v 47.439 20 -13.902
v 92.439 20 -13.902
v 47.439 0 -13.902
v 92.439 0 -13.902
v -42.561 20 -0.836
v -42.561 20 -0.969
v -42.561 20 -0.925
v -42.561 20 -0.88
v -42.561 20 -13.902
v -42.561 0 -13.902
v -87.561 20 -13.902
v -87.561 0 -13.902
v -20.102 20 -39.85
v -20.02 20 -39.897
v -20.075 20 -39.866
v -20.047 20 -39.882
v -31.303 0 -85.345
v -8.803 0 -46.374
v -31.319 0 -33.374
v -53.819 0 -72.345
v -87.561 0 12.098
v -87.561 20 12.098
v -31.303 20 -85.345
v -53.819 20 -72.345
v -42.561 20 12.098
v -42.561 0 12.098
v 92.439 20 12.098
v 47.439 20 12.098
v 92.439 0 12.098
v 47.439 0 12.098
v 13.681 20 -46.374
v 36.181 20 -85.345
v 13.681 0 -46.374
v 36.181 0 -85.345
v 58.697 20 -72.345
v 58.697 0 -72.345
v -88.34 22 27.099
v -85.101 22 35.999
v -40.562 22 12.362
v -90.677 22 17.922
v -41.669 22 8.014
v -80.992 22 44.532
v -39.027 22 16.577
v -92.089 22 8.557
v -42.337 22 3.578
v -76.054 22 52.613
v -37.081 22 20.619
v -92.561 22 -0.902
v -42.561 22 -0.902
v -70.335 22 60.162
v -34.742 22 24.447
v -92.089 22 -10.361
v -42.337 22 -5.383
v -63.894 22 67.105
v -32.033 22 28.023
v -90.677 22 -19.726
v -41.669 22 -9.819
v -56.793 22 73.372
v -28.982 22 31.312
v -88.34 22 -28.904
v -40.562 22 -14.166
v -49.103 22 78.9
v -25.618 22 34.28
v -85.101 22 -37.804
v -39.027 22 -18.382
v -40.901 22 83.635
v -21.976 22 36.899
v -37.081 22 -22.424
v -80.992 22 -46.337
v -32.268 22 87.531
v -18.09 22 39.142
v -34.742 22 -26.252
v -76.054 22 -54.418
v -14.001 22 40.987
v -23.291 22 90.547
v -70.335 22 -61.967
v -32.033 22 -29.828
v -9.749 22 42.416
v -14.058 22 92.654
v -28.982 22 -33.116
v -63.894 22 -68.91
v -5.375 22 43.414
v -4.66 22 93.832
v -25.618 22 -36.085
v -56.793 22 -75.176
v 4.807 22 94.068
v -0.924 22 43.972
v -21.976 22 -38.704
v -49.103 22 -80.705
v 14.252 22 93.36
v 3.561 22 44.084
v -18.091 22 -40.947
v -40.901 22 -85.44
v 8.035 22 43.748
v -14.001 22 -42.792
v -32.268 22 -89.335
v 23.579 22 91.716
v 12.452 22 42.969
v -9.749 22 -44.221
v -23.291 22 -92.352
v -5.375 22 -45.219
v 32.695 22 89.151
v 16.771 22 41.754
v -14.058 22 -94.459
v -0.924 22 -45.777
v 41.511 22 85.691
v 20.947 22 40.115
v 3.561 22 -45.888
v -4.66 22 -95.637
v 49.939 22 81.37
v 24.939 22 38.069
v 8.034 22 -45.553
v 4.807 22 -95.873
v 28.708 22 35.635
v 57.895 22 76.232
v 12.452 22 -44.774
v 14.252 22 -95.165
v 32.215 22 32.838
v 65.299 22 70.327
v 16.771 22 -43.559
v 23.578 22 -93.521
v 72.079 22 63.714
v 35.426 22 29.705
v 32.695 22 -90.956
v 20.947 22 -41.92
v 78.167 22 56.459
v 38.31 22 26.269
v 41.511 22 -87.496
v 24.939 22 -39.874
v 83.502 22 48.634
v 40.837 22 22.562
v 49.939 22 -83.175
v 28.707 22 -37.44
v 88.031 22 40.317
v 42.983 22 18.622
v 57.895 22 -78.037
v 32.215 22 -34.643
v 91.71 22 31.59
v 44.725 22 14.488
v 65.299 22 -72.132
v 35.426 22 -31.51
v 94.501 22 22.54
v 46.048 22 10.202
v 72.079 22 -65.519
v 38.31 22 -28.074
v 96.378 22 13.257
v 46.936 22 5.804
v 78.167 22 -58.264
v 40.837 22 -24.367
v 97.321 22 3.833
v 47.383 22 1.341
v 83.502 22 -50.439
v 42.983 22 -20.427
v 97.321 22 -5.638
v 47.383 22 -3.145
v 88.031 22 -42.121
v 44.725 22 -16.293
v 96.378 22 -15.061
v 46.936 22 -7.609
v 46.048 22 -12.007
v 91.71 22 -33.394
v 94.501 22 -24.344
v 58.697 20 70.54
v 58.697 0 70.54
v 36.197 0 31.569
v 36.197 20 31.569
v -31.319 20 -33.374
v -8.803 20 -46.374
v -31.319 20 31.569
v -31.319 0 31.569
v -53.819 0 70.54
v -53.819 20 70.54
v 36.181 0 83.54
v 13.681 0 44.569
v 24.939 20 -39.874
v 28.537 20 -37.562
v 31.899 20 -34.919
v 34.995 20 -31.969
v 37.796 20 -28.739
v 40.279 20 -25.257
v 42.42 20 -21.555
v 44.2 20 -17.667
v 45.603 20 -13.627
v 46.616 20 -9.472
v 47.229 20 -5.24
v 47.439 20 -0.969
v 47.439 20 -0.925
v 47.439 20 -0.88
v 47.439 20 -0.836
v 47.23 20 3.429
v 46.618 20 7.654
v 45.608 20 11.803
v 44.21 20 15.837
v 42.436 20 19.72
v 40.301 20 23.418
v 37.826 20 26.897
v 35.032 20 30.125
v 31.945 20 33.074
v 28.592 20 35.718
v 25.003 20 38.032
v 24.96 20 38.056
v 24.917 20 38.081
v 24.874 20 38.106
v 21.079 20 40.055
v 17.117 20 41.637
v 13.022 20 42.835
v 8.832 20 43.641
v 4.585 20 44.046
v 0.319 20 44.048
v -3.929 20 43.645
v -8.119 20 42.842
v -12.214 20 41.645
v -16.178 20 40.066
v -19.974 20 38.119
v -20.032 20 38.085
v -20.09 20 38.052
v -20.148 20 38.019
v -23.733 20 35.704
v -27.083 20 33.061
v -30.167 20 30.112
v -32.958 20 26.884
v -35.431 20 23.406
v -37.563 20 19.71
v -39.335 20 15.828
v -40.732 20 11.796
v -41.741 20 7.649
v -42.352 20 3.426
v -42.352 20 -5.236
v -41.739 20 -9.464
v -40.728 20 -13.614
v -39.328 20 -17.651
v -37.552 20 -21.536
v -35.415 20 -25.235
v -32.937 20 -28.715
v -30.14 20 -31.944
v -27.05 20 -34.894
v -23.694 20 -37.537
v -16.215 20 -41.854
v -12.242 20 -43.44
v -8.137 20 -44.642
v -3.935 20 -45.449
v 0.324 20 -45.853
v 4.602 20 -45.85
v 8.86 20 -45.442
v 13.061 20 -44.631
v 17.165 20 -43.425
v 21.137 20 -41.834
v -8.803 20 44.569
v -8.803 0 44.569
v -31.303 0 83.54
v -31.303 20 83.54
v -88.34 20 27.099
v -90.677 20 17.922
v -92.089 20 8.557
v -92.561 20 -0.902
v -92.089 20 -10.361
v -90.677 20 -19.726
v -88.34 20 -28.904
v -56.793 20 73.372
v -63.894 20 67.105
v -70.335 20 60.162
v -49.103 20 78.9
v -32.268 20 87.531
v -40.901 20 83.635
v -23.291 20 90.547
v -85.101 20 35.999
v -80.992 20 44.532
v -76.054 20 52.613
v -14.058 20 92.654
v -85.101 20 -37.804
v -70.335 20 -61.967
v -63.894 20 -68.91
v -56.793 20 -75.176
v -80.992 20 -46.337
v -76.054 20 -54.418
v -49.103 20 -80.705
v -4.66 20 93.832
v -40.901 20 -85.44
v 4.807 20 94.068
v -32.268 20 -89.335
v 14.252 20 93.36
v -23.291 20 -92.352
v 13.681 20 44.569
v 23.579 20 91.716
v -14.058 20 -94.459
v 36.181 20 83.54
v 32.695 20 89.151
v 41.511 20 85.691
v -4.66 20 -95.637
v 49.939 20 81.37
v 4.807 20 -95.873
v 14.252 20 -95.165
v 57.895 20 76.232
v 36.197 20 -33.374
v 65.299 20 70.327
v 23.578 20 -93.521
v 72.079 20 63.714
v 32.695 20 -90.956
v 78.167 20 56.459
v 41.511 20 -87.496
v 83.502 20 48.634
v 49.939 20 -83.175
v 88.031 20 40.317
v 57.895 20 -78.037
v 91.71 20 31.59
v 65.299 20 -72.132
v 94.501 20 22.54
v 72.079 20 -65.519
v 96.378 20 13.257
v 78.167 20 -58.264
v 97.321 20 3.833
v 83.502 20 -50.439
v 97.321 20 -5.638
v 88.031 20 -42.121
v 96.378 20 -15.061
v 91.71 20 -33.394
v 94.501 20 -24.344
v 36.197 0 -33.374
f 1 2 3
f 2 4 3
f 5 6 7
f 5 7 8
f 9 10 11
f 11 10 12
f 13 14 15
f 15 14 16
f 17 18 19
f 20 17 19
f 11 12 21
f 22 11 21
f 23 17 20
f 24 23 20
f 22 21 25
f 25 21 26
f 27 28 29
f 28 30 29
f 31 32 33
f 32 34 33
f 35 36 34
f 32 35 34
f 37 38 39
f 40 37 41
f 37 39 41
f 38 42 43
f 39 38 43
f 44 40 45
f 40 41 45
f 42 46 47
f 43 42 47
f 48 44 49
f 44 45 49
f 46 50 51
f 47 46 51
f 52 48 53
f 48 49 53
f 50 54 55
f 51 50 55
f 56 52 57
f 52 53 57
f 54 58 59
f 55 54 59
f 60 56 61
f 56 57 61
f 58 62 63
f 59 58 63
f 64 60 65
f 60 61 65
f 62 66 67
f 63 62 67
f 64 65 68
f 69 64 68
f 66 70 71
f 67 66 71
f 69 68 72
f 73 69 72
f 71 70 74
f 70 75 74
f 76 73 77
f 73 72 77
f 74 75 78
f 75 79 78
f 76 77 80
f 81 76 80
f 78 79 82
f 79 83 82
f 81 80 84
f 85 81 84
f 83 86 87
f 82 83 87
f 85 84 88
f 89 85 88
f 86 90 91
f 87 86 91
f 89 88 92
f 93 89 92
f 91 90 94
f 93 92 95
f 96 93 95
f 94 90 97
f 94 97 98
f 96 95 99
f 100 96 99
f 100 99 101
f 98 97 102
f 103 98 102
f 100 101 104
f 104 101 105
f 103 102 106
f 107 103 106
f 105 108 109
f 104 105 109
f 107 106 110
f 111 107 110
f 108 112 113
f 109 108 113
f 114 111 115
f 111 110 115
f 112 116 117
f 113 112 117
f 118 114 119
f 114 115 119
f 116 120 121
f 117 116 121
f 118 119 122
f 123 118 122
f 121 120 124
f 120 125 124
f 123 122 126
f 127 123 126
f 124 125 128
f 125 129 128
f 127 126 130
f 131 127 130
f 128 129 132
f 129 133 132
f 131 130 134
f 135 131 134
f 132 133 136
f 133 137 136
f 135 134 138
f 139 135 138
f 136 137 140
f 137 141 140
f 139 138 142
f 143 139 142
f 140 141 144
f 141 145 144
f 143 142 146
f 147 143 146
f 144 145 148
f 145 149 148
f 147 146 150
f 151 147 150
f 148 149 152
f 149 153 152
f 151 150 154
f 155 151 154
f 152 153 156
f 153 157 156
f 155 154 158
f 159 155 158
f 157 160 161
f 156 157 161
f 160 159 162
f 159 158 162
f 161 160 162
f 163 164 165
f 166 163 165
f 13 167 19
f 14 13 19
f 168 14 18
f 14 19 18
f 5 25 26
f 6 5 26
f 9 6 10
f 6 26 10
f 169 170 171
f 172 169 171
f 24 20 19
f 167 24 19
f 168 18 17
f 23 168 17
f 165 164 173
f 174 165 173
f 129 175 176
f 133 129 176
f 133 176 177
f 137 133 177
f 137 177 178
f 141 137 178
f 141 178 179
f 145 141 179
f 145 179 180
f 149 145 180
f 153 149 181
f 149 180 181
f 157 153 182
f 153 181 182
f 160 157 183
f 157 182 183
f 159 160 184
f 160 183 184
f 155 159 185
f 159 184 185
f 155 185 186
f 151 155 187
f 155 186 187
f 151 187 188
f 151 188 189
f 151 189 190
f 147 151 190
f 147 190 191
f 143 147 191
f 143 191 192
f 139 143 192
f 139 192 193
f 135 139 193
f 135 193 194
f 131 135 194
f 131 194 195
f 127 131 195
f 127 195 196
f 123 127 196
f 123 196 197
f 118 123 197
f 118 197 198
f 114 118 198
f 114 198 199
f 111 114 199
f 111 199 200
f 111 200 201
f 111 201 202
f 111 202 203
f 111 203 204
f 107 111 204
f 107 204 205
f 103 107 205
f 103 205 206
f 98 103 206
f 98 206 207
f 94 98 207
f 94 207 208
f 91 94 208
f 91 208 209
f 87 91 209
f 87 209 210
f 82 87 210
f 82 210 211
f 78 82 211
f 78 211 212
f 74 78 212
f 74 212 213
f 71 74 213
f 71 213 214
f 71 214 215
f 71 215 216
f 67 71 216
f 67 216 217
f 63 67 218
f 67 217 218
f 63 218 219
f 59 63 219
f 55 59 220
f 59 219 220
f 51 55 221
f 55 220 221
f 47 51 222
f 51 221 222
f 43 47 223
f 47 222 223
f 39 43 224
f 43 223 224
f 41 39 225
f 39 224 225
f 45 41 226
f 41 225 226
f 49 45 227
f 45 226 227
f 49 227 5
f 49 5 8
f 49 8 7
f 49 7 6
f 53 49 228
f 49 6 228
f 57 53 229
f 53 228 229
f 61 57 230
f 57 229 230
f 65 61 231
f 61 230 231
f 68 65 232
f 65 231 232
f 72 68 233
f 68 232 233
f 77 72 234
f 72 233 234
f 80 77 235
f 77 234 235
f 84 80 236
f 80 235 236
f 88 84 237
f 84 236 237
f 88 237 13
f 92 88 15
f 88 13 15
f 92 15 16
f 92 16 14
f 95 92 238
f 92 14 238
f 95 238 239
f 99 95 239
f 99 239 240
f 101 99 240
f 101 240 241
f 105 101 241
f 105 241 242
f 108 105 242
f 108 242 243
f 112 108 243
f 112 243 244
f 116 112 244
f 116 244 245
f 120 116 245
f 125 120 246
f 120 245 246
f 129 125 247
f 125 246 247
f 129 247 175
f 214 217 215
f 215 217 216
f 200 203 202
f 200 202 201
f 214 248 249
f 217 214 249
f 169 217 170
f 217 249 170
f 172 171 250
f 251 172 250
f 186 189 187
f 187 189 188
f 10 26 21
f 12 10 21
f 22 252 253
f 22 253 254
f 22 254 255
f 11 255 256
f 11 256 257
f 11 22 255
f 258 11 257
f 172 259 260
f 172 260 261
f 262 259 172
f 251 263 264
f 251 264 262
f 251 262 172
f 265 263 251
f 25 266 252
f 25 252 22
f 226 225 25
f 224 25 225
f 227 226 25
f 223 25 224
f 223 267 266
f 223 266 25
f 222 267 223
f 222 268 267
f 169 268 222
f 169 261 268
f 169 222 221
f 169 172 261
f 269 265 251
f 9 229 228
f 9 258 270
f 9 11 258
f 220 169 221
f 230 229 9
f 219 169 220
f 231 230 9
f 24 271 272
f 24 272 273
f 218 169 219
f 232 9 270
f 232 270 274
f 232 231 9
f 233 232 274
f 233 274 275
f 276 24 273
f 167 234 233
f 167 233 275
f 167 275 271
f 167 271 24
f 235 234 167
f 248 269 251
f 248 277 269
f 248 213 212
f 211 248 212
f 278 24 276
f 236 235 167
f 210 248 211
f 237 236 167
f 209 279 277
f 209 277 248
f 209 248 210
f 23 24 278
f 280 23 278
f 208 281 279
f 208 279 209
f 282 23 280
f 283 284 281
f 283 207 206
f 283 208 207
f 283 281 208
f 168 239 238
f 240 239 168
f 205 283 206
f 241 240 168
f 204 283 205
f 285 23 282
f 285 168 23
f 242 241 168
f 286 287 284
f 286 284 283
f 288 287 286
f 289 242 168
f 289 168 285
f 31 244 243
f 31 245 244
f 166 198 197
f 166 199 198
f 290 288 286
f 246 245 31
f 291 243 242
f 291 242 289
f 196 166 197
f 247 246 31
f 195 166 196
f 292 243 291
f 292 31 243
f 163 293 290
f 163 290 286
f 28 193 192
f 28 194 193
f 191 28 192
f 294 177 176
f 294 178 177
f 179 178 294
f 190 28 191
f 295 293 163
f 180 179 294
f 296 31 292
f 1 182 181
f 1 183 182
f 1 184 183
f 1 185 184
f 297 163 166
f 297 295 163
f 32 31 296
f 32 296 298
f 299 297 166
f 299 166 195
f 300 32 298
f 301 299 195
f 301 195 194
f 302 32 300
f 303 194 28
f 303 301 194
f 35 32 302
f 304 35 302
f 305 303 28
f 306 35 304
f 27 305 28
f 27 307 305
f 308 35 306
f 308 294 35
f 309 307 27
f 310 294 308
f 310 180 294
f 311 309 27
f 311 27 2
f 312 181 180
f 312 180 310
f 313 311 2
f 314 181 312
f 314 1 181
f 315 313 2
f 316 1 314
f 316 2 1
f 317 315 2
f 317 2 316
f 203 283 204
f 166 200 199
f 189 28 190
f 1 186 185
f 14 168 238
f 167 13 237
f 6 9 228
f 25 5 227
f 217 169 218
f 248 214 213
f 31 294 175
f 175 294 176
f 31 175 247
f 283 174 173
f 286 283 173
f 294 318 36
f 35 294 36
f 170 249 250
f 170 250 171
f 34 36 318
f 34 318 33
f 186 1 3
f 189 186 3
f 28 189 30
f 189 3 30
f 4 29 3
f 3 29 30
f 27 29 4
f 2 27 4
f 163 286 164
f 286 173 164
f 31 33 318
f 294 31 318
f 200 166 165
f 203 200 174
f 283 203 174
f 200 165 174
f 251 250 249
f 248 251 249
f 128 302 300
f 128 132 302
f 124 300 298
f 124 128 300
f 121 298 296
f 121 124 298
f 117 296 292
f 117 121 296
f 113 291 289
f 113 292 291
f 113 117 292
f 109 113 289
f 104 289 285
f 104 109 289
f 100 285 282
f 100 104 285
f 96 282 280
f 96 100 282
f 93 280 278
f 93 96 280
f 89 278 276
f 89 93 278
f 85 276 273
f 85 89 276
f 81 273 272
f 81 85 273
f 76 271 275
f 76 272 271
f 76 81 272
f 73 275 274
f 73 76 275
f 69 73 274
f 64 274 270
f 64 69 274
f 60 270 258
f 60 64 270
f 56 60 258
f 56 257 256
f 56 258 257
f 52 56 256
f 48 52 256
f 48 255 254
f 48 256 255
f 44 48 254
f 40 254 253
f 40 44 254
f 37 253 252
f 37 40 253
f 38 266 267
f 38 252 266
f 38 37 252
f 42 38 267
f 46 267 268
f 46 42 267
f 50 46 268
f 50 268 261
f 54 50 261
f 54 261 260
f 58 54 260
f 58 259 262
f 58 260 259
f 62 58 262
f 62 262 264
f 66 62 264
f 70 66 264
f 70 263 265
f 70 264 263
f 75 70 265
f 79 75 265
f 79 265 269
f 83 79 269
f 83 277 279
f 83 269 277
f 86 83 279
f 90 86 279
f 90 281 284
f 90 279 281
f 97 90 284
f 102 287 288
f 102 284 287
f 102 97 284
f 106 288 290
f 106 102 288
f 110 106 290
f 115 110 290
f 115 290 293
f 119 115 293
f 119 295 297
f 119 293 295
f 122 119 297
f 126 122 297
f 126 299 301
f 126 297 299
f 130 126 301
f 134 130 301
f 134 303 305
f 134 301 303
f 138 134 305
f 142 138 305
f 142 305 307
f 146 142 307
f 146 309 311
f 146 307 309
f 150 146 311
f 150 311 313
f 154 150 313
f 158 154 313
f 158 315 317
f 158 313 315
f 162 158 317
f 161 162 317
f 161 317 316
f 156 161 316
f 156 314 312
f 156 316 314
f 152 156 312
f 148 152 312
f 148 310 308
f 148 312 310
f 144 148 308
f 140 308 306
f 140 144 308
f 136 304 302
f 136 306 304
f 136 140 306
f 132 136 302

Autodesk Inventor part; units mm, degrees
ref_plane "YZ Plane" through (0, 0, 0) normal (1, 0, 0) x (0, 1, 0)
ref_plane "XZ Plane" through (0, 0, 0) normal (0, 1, 0) x (-1, 0, 0)
ref_plane "XY Plane" through (0, 0, 0) normal (0, 0, 1) x (1, 0, 0)
sketch "Sketch1" plane through (0, 0, 0) normal (0, 1, 0) x (-1, 0, 0)
  line L0 (-2.439, 103.9756) -> (-2.439, -118.4634)
  line L1 (89.878, -0.9024) -> (-81.0976, -0.9024)
  line L2 (87.561, 12.0976) -> (42.561, 12.0976)
  line L3 (42.561, 12.0976) -> (42.561, -13.9024)
  line L4 (42.561, -13.9024) -> (87.561, -13.9024)
  line L5 (87.561, -13.9024) -> (87.561, 12.0976)
  line L6 (31.3026, 83.5398) -> (8.8026, 44.5687)
  line L7 (8.8026, 44.5687) -> (31.3193, 31.5687)
  line L8 (31.3193, 31.5687) -> (53.8193, 70.5398)
  line L9 (53.8193, 70.5398) -> (31.3026, 83.5398)
  line L10 (-58.6974, 70.5398) -> (-36.1974, 31.5687)
  line L11 (-36.1974, 31.5687) -> (-13.6807, 44.5687)
  line L12 (-13.6807, 44.5687) -> (-36.1807, 83.5398)
  line L13 (-36.1807, 83.5398) -> (-58.6974, 70.5398)
  line L14 (-92.439, -13.9024) -> (-47.439, -13.9024)
  line L15 (-47.439, -13.9024) -> (-47.439, 12.0976)
  line L16 (-47.439, 12.0976) -> (-92.439, 12.0976)
  line L17 (-92.439, 12.0976) -> (-92.439, -13.9024)
  line L18 (-36.1807, -85.3447) -> (-13.6807, -46.3736)
  line L19 (-13.6807, -46.3736) -> (-36.1974, -33.3736)
  line L20 (-36.1974, -33.3736) -> (-58.6974, -72.3447)
  line L21 (-58.6974, -72.3447) -> (-36.1807, -85.3447)
  line L22 (53.8193, -72.3447) -> (31.3193, -33.3736)
  line L23 (31.3193, -33.3736) -> (8.8026, -46.3736)
  line L24 (8.8026, -46.3736) -> (31.3026, -85.3447)
  line L25 (31.3026, -85.3447) -> (53.8193, -72.3447)
  point P0 (0, 0)
  point P1 (-2.439, -0.9024)
  point P2 (43.7195, 79.0465)
  point P3 (-48.5976, 79.0465)
  point P4 (-94.7561, -0.9024)
  point P5 (-48.5976, -80.8514)
  point P6 (43.7195, -80.8514)
  dimension "d0" = 180
  dimension "d1" = 26
  dimension "d3" = 90
  dimension "d6" = 360
extrude "Extrusion1" add sketch "Sketch1" along normal blind 20
sketch "Sketch2" plane through (-8.8026, 0, -46.3736) normal (0.5, 0, 0.866) x (0.866, 0, -0.5)
  line L0 (-26, 0) -> (0, 0) projected
  line L1 (0, 0) -> (0, 20) projected
  line L2 (-26, 20) -> (0, 20) projected
  line L3 (-26, 0) -> (-26, 20) projected
  line L4 (-23, 23) -> (0, 0)
  line L5 (-26, 20) -> (0, 20) projected
  line L6 (-23, -3) -> (0, 20)
  point P0 (-15.5635, 0)
  point P1 (-11.6957, 8.3043)
extrude "Extrusion2" [suppressed]
pattern_circular "Circular Pattern1" [suppressed]
ref_plane "Work Plane1" through (24.939, 0, -39.8736) normal (-0.866, 0, -0.5) x (-0.5, 0, 0.866)
sketch "Sketch3" plane through (24.939, 0, -39.8736) normal (-0.866, 0, -0.5) x (-0.5, 0, 0.866)
  line L0 (45, 26.4) -> (45, -4.4) projected
  line L1 (0, 20) -> (-50, 20)
  line L2 (-50, 20) -> (-50, 22)
  line L3 (-50, 22) -> (0, 22)
  line L4 (0, 22) -> (0, 20)
  line L5 (-11.2583, 20) -> (11.2583, 20) projected
  point P0 (47.001, 0)
  dimension "d16" = 90
  dimension "d18" = 2
  dimension "d19" = 0
  dimension "d21" = 190
revolve "Revolution1" add sketch "Sketch3" angle 360 about axis through (2.439, 0, -0.9024) along (0, -1, 0)
properties part number "rotor-type2"
